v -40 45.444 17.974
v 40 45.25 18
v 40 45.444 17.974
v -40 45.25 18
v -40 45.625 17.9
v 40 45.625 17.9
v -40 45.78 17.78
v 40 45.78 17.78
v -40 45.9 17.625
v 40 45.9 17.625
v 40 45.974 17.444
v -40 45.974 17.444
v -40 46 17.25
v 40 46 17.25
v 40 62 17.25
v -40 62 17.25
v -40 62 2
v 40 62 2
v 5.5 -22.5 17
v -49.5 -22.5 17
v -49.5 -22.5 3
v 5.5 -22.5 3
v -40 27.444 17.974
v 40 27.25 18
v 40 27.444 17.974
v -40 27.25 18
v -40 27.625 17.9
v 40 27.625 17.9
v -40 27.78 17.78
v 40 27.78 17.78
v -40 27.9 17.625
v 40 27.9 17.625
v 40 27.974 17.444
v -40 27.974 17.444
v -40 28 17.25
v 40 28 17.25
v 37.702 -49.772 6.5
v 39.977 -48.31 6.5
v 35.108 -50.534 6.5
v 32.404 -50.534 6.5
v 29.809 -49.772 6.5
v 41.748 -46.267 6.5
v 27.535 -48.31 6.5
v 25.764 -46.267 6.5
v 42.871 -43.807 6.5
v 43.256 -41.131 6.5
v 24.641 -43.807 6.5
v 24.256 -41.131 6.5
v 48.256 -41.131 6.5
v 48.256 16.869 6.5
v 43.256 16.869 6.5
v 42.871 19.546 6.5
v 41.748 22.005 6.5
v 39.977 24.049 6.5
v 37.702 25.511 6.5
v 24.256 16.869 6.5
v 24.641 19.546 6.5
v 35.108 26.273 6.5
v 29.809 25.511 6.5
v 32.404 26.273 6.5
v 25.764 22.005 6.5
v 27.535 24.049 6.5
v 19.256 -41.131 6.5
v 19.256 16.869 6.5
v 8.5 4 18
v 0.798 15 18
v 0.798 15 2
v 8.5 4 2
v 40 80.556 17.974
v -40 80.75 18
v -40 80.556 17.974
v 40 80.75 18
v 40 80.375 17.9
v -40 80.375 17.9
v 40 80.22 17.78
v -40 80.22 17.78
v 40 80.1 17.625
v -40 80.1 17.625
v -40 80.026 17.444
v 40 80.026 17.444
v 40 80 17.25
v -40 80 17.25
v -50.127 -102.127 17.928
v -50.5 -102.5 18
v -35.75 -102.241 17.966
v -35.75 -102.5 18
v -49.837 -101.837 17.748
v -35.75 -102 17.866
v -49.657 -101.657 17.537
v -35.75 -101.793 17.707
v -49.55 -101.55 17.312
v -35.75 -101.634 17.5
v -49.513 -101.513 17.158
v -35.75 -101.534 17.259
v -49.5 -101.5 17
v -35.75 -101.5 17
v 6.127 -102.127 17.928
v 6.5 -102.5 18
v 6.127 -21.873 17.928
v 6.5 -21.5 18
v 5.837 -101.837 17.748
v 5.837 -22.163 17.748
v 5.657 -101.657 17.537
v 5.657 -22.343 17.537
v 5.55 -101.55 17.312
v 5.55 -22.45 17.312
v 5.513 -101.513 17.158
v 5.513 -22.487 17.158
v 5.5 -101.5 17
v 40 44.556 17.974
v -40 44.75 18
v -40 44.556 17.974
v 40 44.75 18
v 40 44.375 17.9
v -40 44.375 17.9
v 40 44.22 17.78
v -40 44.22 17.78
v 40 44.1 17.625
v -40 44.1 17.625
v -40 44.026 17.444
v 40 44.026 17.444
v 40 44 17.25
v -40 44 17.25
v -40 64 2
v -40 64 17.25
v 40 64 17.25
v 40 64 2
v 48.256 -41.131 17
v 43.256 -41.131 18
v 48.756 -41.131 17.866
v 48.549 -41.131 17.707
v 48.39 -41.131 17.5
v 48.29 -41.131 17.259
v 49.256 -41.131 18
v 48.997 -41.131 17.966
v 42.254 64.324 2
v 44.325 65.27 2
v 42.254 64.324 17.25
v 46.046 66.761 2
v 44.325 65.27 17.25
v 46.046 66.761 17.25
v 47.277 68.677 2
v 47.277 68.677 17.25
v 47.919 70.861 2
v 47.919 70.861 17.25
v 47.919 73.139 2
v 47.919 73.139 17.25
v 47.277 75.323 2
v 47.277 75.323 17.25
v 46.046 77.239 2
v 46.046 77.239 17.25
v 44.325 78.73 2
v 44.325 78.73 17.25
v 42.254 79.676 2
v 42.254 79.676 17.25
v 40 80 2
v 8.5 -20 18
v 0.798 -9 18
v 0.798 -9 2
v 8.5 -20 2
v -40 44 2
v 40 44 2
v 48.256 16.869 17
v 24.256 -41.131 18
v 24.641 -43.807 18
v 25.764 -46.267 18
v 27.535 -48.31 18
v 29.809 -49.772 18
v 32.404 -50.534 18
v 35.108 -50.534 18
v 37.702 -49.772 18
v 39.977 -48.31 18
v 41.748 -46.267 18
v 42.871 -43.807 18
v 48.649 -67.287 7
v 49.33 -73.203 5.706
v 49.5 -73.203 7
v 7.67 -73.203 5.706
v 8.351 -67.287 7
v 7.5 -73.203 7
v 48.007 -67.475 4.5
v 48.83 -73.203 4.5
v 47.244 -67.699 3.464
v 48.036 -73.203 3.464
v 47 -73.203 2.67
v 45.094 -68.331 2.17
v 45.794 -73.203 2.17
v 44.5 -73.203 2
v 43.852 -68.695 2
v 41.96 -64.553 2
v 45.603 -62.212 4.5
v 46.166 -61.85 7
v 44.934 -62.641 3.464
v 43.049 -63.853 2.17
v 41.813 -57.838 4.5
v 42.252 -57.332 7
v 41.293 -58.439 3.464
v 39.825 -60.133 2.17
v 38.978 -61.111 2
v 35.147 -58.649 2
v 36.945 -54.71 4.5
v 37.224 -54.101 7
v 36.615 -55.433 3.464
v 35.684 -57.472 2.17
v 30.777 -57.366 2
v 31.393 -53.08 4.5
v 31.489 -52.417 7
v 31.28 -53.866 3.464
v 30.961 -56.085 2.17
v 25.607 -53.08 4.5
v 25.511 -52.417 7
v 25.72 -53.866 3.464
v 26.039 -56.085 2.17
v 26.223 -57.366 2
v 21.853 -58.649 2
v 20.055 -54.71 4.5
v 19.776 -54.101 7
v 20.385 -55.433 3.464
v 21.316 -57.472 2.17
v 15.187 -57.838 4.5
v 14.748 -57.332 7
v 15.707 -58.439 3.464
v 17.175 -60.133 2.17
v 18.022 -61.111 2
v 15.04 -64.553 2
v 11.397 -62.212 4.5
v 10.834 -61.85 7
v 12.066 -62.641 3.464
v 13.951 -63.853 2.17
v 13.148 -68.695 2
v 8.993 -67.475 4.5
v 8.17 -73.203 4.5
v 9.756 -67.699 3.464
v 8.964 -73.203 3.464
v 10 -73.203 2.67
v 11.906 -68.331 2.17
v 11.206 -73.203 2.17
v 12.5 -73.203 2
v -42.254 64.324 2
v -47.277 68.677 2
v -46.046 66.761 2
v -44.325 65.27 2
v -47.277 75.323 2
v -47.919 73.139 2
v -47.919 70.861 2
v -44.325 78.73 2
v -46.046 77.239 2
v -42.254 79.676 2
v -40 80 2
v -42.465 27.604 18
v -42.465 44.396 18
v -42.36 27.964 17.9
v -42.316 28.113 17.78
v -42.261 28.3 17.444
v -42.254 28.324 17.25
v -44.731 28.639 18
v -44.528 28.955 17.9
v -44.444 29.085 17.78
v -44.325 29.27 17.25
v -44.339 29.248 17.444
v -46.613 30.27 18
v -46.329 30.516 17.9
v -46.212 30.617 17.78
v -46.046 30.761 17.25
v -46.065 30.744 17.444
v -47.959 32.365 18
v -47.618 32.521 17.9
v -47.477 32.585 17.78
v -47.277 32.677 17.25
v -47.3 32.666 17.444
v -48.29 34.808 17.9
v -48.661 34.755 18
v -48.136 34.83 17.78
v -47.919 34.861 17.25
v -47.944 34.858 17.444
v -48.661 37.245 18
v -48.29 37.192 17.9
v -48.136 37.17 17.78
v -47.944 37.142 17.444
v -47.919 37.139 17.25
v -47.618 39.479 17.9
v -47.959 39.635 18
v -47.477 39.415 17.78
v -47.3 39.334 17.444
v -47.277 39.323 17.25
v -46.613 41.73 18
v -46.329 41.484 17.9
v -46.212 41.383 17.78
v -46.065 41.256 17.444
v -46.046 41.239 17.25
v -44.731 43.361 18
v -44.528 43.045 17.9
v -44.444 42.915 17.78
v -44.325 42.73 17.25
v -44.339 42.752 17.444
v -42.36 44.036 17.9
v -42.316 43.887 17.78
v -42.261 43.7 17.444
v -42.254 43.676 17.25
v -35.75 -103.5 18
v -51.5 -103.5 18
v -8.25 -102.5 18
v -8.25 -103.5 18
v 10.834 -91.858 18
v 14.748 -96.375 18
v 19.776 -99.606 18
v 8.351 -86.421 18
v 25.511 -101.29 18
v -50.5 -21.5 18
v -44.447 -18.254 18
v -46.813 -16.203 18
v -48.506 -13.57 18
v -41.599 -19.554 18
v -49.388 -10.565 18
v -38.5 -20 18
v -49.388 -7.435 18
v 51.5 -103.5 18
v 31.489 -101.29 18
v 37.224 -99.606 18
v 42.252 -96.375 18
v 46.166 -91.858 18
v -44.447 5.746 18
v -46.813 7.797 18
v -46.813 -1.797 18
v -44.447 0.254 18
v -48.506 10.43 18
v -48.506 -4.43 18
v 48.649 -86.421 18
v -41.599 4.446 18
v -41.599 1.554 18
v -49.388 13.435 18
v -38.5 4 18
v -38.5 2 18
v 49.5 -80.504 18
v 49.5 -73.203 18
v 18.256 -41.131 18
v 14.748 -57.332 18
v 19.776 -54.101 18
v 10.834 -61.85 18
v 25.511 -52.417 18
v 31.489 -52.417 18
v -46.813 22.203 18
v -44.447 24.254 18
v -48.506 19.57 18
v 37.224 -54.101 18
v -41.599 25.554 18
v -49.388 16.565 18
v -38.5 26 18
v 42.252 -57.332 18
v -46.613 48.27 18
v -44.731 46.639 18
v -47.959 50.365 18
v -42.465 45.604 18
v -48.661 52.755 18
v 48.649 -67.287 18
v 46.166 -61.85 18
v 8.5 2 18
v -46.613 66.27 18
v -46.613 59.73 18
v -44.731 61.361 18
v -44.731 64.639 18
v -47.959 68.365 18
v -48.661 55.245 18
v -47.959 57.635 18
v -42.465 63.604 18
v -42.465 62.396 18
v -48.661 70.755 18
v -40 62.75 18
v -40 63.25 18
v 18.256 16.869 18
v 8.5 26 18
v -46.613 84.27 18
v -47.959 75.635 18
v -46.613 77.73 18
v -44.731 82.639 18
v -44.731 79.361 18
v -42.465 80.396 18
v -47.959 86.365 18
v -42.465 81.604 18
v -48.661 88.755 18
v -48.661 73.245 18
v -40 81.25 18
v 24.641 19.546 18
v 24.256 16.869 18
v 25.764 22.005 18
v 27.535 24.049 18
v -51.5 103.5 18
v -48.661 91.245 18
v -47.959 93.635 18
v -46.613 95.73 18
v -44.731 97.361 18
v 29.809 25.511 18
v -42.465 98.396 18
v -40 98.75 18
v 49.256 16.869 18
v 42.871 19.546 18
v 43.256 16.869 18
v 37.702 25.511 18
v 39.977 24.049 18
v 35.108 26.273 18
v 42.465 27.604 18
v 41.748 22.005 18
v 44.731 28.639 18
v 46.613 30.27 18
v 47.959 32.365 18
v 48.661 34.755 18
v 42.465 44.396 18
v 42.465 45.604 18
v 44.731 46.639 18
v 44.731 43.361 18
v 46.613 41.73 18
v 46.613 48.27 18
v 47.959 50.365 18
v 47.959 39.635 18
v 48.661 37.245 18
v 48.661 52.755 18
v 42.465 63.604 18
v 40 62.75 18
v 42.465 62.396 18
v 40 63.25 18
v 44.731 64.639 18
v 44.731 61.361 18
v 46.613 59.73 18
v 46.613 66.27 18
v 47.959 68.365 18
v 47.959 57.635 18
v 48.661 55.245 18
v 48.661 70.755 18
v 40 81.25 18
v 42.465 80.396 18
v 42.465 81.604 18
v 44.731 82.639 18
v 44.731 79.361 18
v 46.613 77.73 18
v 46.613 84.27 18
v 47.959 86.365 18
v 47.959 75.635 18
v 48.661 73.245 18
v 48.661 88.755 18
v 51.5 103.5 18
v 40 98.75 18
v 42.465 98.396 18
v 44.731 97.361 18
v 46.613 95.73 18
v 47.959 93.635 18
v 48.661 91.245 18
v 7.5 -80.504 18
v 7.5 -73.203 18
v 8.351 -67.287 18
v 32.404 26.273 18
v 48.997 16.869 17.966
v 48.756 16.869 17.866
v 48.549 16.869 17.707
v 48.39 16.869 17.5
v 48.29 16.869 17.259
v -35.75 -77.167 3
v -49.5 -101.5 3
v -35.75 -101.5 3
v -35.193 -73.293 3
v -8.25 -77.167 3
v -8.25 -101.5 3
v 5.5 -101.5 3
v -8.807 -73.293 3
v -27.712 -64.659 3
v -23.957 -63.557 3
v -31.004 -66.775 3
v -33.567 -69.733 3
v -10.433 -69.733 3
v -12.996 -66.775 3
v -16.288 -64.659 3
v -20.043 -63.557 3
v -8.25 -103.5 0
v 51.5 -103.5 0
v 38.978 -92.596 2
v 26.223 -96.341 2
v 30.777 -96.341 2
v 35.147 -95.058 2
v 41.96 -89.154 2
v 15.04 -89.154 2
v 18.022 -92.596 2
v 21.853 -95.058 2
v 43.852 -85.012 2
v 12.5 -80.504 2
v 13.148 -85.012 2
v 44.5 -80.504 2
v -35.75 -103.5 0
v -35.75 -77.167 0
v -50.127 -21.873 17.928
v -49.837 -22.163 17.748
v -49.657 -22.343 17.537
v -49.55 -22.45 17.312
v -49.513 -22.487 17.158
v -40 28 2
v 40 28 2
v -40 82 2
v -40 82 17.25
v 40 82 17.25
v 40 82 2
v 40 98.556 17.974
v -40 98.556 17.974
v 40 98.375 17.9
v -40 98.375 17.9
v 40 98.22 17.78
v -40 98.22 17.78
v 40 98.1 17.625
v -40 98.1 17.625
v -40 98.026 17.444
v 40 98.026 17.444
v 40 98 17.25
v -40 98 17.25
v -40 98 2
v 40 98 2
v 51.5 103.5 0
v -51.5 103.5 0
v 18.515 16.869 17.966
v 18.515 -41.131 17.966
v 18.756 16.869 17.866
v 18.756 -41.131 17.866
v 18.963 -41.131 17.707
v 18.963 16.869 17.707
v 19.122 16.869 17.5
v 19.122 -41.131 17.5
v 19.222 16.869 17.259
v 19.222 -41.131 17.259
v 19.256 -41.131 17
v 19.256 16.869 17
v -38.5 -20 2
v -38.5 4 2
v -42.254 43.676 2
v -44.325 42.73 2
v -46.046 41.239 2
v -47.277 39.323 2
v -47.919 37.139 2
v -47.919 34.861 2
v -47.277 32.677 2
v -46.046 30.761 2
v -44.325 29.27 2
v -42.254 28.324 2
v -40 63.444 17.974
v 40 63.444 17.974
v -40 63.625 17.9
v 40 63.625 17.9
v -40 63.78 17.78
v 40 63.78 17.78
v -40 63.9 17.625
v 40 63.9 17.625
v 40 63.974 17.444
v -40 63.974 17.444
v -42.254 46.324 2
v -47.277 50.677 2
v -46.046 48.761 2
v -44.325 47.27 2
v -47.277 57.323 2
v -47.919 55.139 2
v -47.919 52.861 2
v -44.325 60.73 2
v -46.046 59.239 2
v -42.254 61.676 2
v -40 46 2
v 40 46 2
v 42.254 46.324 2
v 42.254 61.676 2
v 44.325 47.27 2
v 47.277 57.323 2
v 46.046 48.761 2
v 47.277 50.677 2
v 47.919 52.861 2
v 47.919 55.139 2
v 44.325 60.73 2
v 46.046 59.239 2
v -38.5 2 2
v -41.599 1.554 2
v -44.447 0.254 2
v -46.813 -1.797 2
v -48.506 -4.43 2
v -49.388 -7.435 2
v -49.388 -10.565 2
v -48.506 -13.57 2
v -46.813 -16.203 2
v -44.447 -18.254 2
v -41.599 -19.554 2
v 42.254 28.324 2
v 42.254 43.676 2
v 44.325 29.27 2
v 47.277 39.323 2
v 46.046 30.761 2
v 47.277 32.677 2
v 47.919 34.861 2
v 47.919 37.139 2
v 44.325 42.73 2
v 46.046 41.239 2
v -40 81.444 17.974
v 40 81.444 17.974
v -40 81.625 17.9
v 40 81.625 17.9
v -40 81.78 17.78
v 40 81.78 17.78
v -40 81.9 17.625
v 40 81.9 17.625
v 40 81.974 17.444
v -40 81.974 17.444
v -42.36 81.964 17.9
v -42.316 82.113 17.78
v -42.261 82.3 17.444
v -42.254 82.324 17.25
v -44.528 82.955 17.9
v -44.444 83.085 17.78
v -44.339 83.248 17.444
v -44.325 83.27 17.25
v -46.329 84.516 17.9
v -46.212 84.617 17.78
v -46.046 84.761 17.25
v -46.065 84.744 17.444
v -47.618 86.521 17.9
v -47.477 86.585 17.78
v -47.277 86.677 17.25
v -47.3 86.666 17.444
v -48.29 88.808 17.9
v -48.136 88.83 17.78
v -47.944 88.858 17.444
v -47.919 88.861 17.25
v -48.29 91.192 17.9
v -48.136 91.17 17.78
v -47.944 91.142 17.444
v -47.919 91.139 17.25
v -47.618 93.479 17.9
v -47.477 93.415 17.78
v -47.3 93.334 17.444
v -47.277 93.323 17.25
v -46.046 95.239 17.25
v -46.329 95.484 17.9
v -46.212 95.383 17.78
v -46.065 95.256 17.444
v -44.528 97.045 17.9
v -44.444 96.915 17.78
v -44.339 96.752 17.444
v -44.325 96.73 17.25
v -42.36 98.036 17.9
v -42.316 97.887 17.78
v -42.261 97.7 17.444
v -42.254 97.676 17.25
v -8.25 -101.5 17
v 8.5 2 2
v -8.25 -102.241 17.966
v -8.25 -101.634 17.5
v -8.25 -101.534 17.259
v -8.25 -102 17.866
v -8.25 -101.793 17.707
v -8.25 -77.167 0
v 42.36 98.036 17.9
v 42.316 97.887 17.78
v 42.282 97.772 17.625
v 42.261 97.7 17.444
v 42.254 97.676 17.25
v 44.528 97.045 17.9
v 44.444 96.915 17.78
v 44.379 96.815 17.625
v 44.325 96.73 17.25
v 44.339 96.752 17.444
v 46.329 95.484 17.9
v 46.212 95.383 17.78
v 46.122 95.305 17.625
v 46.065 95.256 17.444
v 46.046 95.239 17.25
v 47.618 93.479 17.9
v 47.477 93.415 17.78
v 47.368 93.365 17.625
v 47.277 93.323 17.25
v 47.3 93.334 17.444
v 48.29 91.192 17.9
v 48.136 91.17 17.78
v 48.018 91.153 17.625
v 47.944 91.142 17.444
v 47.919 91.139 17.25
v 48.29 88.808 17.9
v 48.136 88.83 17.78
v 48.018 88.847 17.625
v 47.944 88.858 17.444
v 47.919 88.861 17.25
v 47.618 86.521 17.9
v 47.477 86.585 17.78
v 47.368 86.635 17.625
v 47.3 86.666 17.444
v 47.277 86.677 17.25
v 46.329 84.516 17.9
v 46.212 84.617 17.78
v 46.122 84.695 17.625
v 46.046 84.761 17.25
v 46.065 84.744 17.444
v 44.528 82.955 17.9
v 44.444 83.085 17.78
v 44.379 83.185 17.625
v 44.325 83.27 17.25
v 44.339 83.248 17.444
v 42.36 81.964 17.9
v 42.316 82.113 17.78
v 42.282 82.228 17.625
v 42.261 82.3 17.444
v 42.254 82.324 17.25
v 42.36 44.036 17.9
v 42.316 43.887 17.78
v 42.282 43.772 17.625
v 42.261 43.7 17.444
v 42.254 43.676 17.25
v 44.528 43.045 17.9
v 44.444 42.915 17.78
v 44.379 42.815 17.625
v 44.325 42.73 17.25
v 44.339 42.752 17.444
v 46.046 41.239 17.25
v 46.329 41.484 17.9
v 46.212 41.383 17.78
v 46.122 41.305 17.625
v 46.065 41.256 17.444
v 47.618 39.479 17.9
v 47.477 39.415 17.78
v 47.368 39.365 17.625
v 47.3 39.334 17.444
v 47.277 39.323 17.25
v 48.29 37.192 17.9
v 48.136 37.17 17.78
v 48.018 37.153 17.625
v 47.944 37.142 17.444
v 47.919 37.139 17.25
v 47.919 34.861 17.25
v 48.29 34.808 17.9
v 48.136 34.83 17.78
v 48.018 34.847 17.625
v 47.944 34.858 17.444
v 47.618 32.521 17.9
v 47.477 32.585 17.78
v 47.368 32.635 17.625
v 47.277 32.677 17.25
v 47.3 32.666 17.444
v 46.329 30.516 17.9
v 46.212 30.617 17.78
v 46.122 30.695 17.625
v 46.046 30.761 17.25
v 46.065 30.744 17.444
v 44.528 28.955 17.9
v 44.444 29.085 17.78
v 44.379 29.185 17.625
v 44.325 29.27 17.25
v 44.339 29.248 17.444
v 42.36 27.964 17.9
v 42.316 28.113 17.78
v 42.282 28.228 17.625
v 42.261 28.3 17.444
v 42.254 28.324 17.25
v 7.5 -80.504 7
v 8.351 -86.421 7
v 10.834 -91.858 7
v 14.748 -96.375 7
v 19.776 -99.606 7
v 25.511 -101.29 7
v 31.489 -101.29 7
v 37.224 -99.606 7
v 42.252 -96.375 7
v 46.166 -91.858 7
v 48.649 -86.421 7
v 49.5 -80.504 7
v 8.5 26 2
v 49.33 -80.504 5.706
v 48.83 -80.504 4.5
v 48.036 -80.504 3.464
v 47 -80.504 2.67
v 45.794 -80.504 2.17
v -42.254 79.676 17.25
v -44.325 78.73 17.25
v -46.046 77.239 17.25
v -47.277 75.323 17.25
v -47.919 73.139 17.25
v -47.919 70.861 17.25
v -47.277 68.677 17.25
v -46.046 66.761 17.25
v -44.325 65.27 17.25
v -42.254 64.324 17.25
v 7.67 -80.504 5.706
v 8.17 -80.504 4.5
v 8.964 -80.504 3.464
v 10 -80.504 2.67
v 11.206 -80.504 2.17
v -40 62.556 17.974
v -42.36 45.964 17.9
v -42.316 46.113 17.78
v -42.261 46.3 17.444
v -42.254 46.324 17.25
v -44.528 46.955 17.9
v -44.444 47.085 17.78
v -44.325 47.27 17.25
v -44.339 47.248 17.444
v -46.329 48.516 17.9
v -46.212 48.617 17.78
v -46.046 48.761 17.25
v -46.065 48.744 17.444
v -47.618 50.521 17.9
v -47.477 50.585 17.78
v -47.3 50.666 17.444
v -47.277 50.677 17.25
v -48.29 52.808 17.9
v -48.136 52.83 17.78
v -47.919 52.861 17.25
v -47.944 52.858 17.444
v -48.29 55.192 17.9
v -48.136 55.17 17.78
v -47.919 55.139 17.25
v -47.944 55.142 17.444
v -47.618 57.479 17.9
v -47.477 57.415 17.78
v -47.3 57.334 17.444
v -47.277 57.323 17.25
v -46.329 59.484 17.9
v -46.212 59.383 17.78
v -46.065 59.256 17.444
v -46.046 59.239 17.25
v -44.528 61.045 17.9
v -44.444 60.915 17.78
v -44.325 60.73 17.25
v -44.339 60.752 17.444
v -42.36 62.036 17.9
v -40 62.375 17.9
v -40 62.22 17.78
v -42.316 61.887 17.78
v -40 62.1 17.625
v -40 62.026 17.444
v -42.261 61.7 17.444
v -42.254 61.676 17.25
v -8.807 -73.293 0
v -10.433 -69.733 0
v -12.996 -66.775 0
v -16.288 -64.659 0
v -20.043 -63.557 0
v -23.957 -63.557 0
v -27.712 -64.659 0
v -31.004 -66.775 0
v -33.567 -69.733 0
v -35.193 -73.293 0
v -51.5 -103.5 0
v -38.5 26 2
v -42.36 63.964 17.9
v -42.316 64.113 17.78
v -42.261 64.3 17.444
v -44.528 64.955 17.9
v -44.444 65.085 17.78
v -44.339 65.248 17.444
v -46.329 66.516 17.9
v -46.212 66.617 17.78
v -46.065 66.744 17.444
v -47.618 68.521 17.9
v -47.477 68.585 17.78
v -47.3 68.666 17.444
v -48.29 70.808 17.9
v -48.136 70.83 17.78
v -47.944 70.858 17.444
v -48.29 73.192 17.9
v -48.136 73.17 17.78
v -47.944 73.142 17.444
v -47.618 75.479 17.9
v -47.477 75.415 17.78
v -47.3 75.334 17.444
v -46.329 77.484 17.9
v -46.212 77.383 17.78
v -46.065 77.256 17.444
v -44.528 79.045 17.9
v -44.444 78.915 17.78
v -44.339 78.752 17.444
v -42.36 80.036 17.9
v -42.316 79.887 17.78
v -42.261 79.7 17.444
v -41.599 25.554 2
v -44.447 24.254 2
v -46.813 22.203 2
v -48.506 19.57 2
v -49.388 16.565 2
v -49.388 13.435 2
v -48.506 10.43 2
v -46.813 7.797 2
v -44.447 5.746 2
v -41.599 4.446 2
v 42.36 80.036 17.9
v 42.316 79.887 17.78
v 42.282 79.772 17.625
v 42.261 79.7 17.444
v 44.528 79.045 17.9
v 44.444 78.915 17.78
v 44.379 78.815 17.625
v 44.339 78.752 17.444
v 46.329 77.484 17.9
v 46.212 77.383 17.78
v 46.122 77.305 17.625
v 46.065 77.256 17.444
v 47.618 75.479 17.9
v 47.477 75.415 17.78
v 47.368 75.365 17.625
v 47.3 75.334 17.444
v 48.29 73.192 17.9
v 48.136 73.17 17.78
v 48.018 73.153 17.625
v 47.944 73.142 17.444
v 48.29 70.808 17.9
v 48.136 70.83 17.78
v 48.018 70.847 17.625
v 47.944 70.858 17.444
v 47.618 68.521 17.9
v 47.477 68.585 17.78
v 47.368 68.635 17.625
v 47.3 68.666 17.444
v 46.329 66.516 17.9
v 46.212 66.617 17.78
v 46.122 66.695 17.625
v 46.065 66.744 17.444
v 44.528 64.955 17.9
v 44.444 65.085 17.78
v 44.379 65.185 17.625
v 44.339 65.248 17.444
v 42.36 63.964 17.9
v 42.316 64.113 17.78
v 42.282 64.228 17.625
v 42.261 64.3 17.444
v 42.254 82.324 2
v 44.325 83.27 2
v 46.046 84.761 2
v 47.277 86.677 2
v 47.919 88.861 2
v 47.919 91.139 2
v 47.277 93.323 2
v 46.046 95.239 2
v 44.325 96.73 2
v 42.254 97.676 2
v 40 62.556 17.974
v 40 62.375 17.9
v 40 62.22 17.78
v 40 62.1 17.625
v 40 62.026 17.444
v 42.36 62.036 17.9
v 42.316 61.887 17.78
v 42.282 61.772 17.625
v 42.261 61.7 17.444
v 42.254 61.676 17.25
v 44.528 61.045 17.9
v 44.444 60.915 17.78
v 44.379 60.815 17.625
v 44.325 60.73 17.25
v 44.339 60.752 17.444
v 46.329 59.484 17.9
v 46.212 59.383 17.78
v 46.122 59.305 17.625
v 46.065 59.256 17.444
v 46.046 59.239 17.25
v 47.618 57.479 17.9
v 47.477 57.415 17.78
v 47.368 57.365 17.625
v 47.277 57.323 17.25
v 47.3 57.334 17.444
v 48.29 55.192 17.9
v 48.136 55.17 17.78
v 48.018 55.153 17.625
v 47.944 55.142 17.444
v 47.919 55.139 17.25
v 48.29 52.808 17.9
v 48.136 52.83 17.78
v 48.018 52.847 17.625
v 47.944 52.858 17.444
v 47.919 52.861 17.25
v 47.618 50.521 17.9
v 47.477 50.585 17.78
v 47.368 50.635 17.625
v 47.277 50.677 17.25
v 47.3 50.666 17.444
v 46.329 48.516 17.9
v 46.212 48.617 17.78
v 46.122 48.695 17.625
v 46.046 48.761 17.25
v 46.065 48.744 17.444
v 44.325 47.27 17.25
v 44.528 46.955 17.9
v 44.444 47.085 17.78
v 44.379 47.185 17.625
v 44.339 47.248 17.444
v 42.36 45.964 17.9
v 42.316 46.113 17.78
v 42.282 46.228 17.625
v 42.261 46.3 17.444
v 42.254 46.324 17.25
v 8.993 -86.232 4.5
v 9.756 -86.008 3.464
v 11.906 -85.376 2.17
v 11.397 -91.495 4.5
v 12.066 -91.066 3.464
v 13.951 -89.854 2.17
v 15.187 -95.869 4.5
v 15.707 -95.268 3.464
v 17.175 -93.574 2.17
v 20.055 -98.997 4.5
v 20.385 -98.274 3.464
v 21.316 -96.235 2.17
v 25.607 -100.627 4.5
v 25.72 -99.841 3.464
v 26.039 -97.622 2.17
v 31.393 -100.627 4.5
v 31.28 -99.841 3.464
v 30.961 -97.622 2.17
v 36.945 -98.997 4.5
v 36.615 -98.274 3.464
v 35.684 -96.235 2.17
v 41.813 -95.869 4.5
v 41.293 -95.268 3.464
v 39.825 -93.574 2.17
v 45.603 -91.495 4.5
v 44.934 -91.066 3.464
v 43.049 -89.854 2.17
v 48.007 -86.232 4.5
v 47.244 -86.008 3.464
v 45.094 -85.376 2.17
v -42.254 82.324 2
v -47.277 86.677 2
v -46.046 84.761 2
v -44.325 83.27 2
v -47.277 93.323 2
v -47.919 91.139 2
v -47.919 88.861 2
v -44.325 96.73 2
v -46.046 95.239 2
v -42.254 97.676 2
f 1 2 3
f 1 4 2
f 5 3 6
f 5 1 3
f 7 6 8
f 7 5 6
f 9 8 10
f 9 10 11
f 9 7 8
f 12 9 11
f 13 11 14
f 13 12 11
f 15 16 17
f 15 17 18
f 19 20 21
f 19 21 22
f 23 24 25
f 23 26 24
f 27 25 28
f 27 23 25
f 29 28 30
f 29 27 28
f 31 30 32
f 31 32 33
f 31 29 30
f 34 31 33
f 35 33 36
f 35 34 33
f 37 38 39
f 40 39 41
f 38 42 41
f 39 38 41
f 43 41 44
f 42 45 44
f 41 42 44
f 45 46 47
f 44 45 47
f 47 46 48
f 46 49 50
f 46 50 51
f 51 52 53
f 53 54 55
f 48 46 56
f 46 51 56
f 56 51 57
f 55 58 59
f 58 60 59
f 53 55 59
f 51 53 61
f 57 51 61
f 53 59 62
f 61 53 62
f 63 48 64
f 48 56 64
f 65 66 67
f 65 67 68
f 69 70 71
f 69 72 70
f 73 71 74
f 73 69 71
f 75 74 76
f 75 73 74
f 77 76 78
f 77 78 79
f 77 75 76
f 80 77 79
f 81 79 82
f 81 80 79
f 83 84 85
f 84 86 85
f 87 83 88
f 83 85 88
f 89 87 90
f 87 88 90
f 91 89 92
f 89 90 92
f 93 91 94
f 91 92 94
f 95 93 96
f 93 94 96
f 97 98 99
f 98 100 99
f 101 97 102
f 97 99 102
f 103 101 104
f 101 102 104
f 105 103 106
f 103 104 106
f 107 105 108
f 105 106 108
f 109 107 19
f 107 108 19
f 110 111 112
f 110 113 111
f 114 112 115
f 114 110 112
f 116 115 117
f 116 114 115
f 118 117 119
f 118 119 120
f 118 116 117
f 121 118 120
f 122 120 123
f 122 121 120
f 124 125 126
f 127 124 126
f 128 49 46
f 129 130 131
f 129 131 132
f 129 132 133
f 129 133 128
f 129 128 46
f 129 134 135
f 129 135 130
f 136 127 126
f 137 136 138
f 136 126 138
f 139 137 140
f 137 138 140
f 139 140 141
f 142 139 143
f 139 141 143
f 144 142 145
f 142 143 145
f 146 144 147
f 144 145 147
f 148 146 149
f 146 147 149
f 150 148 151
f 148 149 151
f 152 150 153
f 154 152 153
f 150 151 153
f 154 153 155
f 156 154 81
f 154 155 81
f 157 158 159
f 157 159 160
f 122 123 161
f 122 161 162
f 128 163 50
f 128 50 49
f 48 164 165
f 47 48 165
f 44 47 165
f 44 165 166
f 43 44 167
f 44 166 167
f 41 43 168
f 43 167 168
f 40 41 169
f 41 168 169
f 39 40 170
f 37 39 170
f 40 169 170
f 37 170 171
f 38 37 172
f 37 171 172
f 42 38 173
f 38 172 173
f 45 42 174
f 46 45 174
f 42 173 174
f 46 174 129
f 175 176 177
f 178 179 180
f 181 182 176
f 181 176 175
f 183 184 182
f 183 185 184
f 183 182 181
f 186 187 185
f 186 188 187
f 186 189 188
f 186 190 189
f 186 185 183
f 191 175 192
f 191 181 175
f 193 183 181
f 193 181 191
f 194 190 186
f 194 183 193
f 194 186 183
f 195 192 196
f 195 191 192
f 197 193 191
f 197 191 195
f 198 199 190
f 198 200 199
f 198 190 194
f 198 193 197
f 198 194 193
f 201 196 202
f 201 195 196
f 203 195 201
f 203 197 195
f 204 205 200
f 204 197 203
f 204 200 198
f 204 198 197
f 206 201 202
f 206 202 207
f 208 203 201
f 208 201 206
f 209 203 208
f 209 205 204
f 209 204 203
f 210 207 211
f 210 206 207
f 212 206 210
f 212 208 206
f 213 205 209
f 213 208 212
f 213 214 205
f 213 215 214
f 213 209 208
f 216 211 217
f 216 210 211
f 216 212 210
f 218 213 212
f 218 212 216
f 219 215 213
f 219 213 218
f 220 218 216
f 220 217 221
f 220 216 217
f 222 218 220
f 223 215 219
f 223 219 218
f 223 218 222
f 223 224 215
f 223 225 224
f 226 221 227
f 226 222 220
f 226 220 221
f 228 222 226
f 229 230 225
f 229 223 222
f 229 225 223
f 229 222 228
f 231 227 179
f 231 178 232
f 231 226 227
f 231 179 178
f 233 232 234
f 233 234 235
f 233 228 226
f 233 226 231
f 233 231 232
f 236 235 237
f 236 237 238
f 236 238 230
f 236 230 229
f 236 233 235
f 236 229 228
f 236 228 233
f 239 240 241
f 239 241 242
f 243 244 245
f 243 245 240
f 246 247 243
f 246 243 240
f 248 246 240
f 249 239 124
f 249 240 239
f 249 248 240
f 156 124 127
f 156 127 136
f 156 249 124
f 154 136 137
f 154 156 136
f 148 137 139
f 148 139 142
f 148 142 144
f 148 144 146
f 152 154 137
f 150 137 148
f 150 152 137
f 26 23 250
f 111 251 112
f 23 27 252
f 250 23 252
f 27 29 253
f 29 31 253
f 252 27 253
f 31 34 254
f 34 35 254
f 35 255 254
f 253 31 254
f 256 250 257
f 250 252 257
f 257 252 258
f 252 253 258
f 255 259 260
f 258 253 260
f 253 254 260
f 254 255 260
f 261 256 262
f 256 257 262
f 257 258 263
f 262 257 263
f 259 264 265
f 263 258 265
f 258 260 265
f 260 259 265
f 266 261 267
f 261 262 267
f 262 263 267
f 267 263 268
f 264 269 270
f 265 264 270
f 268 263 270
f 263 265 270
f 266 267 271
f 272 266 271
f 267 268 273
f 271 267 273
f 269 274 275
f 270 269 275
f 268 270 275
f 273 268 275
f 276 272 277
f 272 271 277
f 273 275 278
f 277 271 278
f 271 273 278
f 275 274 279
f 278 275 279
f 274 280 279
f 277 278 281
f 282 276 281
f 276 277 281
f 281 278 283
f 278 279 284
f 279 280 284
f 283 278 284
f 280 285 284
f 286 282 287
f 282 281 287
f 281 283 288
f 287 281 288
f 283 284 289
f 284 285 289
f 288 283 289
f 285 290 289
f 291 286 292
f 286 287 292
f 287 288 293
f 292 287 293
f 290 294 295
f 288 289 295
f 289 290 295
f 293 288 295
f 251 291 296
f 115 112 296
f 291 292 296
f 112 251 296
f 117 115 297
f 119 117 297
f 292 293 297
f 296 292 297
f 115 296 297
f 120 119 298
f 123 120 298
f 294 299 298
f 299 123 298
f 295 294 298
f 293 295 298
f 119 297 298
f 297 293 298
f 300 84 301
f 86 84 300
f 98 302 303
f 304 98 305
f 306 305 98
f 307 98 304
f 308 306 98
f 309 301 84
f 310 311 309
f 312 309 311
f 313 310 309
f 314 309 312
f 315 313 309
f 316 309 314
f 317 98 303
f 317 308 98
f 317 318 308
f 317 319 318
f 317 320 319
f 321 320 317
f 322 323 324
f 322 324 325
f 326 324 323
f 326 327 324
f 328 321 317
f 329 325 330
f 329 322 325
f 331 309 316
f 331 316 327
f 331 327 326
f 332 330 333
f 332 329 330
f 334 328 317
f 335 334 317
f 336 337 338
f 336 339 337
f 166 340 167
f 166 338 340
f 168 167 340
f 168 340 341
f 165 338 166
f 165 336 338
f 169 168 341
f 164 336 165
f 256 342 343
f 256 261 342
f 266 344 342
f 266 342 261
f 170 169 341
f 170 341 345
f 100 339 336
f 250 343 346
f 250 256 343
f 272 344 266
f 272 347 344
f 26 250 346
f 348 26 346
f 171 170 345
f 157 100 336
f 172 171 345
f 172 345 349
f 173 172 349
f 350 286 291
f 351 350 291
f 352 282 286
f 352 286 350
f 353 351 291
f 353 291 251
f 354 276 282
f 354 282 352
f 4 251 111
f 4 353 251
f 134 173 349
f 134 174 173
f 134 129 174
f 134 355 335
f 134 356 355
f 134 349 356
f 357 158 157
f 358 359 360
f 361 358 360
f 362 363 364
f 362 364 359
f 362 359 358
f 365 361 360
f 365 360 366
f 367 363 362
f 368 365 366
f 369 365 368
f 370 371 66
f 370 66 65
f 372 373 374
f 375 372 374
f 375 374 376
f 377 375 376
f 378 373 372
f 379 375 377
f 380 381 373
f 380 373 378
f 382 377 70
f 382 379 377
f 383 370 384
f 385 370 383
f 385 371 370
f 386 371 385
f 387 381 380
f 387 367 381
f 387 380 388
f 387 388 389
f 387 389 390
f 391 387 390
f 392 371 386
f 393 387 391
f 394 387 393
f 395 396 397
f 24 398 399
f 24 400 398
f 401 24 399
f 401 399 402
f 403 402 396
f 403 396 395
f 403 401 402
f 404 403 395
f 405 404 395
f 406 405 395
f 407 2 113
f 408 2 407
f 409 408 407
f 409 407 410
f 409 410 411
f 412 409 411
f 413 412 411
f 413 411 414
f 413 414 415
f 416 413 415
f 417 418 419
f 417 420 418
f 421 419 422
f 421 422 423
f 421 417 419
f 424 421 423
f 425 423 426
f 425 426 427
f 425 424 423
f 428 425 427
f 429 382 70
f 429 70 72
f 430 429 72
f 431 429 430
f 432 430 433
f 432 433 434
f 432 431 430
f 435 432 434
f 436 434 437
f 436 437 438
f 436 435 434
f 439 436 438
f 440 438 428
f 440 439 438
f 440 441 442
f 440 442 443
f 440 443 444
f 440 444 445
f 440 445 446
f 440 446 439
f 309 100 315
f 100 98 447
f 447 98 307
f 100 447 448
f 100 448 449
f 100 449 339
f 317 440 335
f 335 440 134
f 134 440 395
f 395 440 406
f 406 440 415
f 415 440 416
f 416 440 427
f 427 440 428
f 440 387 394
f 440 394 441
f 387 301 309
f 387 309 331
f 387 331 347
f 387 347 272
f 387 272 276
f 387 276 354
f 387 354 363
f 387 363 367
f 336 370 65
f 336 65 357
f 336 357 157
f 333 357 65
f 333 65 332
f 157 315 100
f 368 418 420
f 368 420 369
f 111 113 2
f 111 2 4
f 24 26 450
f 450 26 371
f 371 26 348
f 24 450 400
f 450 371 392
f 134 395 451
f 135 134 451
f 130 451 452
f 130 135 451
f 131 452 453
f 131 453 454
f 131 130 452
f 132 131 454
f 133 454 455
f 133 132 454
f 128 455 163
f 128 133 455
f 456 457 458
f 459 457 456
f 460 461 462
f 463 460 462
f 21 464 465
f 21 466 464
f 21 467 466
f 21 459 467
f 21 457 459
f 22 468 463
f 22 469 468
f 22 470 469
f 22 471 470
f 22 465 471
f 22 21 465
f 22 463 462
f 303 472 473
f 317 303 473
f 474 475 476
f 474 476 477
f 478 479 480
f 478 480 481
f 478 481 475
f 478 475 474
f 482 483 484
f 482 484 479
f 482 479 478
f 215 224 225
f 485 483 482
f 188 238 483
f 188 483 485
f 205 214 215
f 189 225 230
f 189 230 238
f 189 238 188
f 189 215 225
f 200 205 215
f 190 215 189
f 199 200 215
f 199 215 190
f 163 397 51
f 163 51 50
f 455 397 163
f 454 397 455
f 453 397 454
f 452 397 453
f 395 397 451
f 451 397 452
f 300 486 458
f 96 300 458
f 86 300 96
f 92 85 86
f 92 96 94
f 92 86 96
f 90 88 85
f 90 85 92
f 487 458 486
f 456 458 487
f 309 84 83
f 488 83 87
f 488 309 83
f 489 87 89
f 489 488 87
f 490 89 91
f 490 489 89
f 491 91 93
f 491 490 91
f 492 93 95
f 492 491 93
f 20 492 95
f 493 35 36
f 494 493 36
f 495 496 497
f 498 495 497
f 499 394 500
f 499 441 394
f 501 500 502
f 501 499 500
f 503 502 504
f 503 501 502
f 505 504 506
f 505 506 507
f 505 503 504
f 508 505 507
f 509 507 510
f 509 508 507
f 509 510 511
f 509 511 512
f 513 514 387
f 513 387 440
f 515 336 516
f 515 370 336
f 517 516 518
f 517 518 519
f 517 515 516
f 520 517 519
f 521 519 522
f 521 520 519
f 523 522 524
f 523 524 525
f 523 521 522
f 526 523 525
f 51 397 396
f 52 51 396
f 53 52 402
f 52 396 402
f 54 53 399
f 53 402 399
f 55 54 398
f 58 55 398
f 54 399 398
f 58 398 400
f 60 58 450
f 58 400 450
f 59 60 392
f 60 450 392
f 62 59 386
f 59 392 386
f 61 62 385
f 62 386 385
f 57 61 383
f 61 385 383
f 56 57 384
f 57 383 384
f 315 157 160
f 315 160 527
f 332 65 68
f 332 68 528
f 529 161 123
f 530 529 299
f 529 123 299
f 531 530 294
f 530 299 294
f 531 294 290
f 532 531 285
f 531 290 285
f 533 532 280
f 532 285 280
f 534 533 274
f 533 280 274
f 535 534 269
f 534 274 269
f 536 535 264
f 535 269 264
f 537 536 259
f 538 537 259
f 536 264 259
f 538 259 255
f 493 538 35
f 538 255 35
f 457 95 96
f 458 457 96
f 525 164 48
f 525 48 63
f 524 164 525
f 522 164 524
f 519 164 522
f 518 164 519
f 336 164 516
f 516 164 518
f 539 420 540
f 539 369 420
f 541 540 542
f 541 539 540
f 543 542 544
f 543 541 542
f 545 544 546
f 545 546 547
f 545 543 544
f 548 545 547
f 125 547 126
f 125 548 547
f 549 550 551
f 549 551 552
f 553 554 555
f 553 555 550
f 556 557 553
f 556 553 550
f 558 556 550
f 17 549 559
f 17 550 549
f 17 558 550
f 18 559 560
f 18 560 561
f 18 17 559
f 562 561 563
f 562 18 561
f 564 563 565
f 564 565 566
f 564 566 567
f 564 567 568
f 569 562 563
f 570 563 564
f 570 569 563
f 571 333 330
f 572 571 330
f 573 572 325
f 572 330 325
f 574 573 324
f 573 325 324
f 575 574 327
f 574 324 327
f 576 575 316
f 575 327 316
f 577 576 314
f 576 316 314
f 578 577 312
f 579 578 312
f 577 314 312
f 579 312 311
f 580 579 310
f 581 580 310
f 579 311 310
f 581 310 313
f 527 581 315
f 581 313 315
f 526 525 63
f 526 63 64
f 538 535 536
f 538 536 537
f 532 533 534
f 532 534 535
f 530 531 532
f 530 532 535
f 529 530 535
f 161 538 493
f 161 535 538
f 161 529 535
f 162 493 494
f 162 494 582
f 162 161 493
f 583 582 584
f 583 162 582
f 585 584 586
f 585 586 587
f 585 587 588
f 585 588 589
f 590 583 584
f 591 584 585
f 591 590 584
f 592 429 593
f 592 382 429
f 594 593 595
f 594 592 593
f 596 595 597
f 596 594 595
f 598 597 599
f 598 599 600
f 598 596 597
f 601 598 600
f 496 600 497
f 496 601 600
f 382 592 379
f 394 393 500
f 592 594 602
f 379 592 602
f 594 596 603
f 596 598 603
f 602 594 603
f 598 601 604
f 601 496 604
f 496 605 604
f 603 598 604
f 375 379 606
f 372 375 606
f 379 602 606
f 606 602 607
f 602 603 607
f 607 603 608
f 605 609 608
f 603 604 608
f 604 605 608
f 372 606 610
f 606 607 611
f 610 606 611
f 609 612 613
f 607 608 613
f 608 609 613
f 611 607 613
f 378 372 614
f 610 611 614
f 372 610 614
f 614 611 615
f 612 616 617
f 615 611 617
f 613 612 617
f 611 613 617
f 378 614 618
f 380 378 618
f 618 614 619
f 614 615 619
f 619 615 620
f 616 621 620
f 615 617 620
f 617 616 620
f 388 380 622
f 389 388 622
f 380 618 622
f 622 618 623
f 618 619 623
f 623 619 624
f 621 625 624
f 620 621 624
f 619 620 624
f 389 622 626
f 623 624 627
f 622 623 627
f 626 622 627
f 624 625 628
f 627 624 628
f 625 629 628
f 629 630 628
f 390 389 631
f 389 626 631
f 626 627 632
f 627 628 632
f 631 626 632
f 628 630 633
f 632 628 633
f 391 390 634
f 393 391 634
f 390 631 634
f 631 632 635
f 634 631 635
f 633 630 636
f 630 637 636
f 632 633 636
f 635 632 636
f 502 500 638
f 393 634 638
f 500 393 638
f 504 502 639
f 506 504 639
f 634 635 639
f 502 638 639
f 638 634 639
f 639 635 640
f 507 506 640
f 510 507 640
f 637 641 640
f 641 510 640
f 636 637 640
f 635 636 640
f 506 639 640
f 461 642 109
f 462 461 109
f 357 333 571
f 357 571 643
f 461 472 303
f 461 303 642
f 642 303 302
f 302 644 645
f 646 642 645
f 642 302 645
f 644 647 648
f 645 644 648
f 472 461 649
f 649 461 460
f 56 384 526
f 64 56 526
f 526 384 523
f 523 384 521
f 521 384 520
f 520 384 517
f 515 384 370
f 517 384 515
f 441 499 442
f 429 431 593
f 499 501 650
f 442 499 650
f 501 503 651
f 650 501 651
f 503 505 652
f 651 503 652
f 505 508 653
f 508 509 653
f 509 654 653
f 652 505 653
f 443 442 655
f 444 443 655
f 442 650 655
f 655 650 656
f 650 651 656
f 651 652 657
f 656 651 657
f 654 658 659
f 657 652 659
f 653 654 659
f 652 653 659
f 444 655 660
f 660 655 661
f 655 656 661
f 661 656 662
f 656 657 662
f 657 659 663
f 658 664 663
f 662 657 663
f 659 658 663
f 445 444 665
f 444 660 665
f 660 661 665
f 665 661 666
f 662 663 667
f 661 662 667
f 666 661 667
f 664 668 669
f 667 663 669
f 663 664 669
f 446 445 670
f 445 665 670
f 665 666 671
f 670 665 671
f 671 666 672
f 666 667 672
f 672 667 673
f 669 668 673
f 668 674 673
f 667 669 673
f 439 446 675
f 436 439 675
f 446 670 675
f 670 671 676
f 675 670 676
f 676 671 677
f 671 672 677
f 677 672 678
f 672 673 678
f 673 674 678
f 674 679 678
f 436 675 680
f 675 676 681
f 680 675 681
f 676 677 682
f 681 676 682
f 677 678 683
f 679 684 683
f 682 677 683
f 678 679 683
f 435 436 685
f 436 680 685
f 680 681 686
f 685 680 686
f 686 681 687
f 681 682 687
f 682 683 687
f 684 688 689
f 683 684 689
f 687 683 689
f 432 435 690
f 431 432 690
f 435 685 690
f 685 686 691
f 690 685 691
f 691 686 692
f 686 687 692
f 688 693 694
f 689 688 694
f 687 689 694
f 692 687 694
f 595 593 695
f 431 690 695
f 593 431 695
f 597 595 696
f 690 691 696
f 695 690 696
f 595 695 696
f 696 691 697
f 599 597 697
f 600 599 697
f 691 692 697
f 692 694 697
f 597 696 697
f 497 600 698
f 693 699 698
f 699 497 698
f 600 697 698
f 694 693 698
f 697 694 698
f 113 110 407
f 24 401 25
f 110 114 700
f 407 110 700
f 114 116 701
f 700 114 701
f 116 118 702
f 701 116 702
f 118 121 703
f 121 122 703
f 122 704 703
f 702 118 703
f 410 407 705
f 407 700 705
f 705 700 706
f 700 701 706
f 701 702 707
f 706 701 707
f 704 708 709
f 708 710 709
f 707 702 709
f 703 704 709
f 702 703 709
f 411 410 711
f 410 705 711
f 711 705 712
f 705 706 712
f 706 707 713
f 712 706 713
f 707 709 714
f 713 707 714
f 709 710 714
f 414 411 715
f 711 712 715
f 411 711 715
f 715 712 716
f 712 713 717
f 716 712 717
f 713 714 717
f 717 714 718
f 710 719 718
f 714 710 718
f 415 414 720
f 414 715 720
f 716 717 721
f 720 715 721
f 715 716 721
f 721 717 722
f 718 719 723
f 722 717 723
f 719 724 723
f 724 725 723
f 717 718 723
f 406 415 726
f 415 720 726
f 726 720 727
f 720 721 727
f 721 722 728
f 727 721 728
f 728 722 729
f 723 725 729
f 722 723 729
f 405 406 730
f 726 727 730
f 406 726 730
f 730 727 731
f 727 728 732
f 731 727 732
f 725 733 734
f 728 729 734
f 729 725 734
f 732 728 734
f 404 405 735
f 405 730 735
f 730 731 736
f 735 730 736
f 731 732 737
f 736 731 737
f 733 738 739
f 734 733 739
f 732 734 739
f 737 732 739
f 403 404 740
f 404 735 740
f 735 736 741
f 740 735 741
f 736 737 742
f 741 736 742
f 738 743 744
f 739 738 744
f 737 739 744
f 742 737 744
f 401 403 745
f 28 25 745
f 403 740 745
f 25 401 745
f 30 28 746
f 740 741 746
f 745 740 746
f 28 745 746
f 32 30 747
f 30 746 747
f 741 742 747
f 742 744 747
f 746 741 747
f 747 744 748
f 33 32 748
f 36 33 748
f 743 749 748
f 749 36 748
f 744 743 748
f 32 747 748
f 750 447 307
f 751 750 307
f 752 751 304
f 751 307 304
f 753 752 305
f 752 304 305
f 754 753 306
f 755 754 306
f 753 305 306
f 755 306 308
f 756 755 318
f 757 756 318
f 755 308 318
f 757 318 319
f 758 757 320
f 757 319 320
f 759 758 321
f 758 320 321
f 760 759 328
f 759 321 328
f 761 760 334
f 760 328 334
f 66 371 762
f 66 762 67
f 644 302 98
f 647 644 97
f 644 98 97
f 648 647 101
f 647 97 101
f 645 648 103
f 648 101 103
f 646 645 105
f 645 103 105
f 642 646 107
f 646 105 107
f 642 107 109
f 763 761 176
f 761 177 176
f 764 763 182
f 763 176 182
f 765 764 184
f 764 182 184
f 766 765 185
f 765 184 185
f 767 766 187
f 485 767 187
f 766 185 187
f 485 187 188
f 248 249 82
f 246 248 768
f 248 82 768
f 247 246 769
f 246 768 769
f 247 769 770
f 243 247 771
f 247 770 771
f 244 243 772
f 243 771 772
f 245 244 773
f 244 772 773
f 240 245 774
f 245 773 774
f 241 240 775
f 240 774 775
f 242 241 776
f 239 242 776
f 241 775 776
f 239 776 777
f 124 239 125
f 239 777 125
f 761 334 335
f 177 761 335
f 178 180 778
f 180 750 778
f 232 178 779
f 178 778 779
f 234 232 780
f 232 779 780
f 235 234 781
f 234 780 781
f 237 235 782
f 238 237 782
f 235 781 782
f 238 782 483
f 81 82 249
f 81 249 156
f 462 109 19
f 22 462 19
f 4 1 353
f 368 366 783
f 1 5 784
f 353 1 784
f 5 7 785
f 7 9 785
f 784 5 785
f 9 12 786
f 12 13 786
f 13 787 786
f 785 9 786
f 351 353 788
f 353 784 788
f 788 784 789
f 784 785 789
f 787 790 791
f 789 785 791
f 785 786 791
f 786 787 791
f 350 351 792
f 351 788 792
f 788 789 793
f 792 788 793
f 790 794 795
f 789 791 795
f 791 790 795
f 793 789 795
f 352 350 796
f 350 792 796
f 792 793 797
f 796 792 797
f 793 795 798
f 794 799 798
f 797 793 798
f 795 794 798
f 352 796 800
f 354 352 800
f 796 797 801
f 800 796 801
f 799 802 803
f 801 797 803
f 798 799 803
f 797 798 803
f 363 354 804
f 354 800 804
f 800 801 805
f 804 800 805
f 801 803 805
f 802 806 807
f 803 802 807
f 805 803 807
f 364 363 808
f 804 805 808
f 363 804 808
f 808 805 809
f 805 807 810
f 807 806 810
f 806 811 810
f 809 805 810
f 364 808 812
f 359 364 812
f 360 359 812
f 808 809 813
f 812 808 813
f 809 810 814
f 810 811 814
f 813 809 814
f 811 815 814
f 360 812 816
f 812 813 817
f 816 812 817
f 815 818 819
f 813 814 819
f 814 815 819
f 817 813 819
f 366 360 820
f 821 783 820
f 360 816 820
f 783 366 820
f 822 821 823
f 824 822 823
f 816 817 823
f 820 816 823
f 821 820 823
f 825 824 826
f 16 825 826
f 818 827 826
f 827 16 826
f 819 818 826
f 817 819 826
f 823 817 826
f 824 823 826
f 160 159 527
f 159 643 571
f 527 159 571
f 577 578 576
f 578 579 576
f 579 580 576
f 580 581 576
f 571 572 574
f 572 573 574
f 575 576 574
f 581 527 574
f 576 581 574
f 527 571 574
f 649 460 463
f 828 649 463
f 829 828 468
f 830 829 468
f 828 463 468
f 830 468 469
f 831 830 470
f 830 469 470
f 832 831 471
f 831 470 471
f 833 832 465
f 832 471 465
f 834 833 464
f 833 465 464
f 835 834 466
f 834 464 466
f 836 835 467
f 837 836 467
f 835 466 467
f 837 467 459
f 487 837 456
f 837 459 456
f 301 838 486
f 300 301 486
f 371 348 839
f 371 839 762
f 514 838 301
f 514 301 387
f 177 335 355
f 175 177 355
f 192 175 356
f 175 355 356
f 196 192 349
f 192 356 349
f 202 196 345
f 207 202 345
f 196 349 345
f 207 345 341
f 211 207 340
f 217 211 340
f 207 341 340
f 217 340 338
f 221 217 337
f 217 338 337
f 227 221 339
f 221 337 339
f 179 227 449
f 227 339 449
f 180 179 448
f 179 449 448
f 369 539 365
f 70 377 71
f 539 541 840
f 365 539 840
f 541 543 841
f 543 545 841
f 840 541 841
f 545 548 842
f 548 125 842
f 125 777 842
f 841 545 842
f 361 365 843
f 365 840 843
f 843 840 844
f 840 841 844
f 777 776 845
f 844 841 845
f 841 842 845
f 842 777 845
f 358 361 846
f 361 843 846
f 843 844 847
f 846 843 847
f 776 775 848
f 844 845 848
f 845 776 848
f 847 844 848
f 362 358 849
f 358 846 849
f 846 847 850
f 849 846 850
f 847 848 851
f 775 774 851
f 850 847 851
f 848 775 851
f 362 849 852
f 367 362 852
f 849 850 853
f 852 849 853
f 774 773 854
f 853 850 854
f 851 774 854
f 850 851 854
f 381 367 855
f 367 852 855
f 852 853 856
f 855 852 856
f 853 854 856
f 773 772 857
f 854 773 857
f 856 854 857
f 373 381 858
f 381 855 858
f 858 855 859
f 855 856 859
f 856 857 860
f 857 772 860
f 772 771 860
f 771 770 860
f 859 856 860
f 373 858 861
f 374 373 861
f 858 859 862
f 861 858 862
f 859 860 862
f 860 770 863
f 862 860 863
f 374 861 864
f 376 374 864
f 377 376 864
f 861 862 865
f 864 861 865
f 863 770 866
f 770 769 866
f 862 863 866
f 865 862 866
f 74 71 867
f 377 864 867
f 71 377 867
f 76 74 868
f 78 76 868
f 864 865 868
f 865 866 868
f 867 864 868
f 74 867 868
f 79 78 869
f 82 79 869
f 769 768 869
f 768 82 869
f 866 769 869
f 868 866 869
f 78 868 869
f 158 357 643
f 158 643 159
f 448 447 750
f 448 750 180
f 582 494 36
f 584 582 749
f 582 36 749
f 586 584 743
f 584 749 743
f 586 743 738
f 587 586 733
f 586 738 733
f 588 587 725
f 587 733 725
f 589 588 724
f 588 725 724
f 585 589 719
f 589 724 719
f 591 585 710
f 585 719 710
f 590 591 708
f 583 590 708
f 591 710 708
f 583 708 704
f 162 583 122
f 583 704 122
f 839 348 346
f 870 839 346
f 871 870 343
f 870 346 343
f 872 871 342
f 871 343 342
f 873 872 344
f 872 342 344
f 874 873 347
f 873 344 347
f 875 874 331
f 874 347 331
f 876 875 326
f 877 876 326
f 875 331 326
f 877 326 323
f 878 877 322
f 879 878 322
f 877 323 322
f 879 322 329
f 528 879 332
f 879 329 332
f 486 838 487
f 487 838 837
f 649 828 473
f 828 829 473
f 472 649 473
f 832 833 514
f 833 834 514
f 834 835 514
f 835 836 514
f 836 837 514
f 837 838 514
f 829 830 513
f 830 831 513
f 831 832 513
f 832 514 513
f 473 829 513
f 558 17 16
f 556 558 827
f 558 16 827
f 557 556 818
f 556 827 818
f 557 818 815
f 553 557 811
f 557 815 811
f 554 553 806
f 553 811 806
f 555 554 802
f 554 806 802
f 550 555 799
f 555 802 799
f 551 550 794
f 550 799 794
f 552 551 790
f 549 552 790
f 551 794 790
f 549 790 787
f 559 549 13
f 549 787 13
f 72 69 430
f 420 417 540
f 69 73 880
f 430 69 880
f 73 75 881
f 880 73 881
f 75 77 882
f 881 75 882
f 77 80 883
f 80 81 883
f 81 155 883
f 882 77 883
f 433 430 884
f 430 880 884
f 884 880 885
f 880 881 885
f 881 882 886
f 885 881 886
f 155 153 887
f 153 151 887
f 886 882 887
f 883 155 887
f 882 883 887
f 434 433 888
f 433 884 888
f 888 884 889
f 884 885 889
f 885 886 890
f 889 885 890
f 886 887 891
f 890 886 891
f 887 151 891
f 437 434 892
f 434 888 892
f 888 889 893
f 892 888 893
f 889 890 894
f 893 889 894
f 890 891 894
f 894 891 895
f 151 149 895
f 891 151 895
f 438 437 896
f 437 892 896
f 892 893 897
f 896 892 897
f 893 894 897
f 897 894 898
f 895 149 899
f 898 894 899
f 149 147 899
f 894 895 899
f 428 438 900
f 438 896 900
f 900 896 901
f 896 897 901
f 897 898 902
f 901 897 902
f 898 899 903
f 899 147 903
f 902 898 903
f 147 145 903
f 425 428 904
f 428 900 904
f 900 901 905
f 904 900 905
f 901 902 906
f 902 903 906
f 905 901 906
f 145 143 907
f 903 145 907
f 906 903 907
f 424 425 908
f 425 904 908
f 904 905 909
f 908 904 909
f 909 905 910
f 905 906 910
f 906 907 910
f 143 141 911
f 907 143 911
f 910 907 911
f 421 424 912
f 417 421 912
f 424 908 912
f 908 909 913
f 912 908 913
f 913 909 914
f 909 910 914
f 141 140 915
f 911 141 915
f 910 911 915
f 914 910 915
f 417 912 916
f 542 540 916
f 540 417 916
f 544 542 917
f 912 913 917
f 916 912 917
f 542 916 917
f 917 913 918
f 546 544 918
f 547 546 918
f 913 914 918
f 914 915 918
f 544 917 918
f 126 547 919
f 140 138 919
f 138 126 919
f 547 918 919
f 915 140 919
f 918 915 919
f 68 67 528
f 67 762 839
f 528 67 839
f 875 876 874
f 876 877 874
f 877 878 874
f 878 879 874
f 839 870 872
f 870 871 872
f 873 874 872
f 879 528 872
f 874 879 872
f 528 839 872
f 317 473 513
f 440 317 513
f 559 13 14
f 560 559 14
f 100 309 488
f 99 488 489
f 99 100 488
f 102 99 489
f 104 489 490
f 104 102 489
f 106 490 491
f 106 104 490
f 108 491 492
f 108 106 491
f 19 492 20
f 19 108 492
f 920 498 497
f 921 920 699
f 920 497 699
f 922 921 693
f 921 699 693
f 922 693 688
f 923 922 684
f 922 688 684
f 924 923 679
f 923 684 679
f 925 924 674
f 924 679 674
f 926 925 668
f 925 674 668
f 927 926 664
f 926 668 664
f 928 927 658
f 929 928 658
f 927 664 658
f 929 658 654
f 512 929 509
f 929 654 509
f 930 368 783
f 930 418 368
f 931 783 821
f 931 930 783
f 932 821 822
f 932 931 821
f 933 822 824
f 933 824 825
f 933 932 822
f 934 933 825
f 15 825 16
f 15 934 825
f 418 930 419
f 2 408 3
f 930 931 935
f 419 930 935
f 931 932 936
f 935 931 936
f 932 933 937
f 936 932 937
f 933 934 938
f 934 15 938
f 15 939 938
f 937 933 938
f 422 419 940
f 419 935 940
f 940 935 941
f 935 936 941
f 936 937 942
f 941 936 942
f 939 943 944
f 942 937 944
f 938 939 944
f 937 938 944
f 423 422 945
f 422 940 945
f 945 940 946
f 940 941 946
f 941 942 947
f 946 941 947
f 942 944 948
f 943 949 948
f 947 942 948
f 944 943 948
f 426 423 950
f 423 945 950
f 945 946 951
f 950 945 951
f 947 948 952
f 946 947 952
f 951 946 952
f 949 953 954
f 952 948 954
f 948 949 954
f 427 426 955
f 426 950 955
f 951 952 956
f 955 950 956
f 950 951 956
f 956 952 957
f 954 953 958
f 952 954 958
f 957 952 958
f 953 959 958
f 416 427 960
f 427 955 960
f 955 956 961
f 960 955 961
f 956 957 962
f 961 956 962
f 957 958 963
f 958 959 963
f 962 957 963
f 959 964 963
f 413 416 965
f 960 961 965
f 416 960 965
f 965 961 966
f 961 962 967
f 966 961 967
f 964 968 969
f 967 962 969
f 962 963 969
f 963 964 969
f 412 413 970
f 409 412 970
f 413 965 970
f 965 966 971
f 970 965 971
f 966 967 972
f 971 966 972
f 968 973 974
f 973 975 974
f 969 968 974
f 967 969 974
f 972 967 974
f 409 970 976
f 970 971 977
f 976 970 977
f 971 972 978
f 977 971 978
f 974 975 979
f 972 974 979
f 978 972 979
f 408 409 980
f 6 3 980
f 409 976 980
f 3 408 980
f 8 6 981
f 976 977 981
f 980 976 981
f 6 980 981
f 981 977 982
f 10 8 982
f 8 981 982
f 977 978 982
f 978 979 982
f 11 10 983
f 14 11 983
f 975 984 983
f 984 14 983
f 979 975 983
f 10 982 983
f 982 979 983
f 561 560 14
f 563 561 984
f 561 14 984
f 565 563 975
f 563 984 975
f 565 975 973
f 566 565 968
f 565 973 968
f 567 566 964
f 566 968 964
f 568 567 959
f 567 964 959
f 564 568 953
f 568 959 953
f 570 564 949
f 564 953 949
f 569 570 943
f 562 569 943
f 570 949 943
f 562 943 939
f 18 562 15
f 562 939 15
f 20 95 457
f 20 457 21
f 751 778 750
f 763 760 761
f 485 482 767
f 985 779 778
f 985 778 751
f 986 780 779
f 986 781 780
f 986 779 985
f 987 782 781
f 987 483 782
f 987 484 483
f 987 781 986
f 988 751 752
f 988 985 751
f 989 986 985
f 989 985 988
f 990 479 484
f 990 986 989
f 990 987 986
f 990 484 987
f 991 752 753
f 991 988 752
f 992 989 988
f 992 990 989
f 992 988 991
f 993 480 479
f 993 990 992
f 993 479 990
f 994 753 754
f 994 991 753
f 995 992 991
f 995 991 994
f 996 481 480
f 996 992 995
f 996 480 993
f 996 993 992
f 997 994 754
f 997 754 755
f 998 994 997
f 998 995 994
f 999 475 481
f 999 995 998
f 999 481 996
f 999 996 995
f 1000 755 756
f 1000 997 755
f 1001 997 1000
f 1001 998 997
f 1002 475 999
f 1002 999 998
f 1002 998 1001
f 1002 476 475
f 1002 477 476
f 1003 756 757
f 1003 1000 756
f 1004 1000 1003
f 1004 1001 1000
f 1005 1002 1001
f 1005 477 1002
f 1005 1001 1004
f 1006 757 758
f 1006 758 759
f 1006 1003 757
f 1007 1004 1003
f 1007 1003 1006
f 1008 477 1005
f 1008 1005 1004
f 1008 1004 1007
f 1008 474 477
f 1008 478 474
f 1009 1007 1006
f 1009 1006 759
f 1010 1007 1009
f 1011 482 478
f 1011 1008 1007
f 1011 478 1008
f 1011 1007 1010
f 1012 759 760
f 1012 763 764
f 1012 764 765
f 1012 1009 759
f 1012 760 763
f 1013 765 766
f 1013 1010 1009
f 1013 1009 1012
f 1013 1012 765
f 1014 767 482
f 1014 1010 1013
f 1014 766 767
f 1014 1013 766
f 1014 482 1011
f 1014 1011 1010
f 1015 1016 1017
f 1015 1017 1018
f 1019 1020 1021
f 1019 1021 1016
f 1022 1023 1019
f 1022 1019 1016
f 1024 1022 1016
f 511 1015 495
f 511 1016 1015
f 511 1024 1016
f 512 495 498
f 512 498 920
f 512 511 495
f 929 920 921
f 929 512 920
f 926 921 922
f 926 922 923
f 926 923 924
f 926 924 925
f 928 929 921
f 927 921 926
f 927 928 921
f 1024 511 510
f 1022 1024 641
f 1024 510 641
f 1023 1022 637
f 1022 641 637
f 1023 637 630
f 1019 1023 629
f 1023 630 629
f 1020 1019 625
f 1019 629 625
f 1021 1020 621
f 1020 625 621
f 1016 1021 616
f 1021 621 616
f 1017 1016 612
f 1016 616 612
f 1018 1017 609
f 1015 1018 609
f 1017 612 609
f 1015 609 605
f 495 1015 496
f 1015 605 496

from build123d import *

# Parameters (mm, degrees)
SKETCH014_W            = 103
SKETCH014_H            = 207
PAD006_DEPTH           = 18
POCKET008_DEPTH        = 16
LINEARPATTERN_COUNT    = 4
LINEARPATTERN_PITCH    = 18
POCKET009_DEPTH        = 16
LINEARPATTERN001_COUNT = 2
LINEARPATTERN001_PITCH = 24
POCKET010_DEPTH        = 11.5
SKETCH019_W            = 55
SKETCH019_H            = 79
POCKET011_DEPTH        = 15
POCKET012_DEPTH        = 100
POCKET012_DEPTH_BACK   = 100
POCKET013_DEPTH        = 16
FILLET003_R            = 1
FILLET004_R            = 5
FILLET005_R            = 1
FILLET006_R            = 0.75


with BuildPart() as part:
    # Sketch014 → Pad006 (new body)
    with BuildSketch(Plane.XY):
        Rectangle(SKETCH014_W, SKETCH014_H)
    extrude(amount=PAD006_DEPTH)

    # Sketch015 (on Face6 of Pad006) → Pocket008 (cut)
    with BuildSketch(Plane(origin=(0, 90, 18), x_dir=(1, 0, 0), z_dir=(0, 0, 1))):
        with BuildLine():
            ThreePointArc((-40, 8), (-48, 0), (-40, -8))
            Line((-40, -8), (40, -8))
            ThreePointArc((40, -8), (48, 0), (40, 8))
            Line((-40, 8), (40, 8))
        make_face()
    pocket008 = extrude(amount=-POCKET008_DEPTH, mode=Mode.SUBTRACT)

    # LinearPattern: Pocket008 ×4
    with Locations(*[(0, -i * LINEARPATTERN_PITCH, 0) for i in range(1, LINEARPATTERN_COUNT)]):
        add(pocket008, mode=Mode.SUBTRACT)

    # Sketch017 → Pocket009 (cut)
    with BuildSketch(Plane(origin=(-15, 15, 18), x_dir=(1, 0, 0), z_dir=(0, 0, 1))):
        with BuildLine():
            Line((-23.5, 11), (23.5, 11))
            Line((23.5, 11), (15.797717, 0))
            Line((15.797717, 0), (23.5, -11))
            Line((23.5, -11), (-23.5, -11))
            ThreePointArc((-23.5, 11), (-34.5, 0), (-23.5, -11))
        make_face()
    pocket009 = extrude(amount=-POCKET009_DEPTH, mode=Mode.SUBTRACT)

    # LinearPattern001: Pocket009 ×2
    with Locations(*[(0, -i * LINEARPATTERN001_PITCH, 0) for i in range(1, LINEARPATTERN001_COUNT)]):
        add(pocket009, mode=Mode.SUBTRACT)

    # Sketch018 (on Face5 of LinearPattern001) → Pocket010 (cut)
    with BuildSketch(Plane.XY.offset(18)):
        with BuildLine():
            Line((48.255785, 16.86923), (48.255785, -41.13077))
            Line((48.255785, -41.13077), (43.255785, -41.13077))
            ThreePointArc((24.255785, -41.13077), (33.755784, -50.63077), (43.255785, -41.13077))
            Line((24.255785, -41.13077), (19.255785, -41.13077))
            Line((19.255785, -41.13077), (19.255785, 16.86923))
            Line((24.255785, 16.86923), (19.255785, 16.86923))
            ThreePointArc((43.255785, 16.86923), (33.755785, 26.36923), (24.255785, 16.86923))
            Line((43.255785, 16.86923), (48.255785, 16.86923))
        make_face()
    extrude(amount=-POCKET010_DEPTH, mode=Mode.SUBTRACT)

    # Sketch019 (on Face5 of Pocket010) → Pocket011 (cut)
    with BuildSketch(Plane.XY.offset(18)):
        with Locations((-22, -62)):
            Rectangle(SKETCH019_W, SKETCH019_H)
    extrude(amount=-POCKET011_DEPTH, mode=Mode.SUBTRACT)

    # Sketch020 (on Face46 of Pocket011) → Pocket012 (cut, two sides)
    with BuildSketch(Plane.XY.offset(3)) as pocket012_sk:
        with BuildLine():
            ThreePointArc((-35.75, -103.5), (-22, -117.25), (-8.25, -103.5))
            Line((-8.25, -103.5), (-8.25, -77.166667))
            ThreePointArc((-8.25, -77.166667), (-22, -63.416667), (-35.75, -77.166667))
            Line((-35.75, -103.5), (-35.75, -77.166667))
        make_face()
    extrude(amount=-POCKET012_DEPTH, mode=Mode.SUBTRACT)
    extrude(pocket012_sk.sketch, amount=POCKET012_DEPTH_BACK, mode=Mode.SUBTRACT)

    # Sketch021 (on Face5 of Pocket012) → Pocket013 (cut)
    with BuildSketch(Plane.XY.offset(18)):
        with BuildLine():
            ThreePointArc((7.5, -80.504131), (28.5, -101.504131), (49.5, -80.504131))
            Line((49.5, -80.504131), (49.5, -73.202981))
            ThreePointArc((49.5, -73.202981), (28.5, -52.202981), (7.5, -73.202981))
            Line((7.5, -80.504131), (7.5, -73.202981))
        make_face()
    extrude(amount=-POCKET013_DEPTH, mode=Mode.SUBTRACT)

    # Fillet003
    fillet003_edges = [part.edges().sort_by_distance(p)[0] for p in [
        (-42.625, -101.5, 18),
        (-49.5, -62, 18),
        (-22, -22.5, 18),
        (5.5, -62, 18),
        (-1.375, -101.5, 18),
    ]]
    fillet(fillet003_edges, radius=FILLET003_R)

    # Fillet004
    fillet004_edges = [part.edges().sort_by_distance(p)[0] for p in [
        (28.5, -52.202981, 2),
    ]]
    fillet(fillet004_edges, radius=FILLET004_R)

    # Fillet005
    fillet005_edges = [part.edges().sort_by_distance(p)[0] for p in [
        (48.255785, -12.13077, 18),
        (19.255785, -12.13077, 18),
    ]]
    fillet(fillet005_edges, radius=FILLET005_R)

    # Fillet006
    fillet006_edges = [part.edges().sort_by_distance(p)[0] for p in [
        (0, 80, 18),
        (-48, 72, 18),
        (0, 64, 18),
        (48, 72, 18),
        (0, 62, 18),
        (-48, 54, 18),
        (0, 46, 18),
        (48, 54, 18),
        (0, 44, 18),
        (-48, 36, 18),
        (0, 28, 18),
        (48, 36, 18),
        (0, 98, 18),
        (-48, 90, 18),
        (0, 82, 18),
        (48, 90, 18),
    ]]
    fillet(fillet006_edges, radius=FILLET006_R)


solid = part.part
